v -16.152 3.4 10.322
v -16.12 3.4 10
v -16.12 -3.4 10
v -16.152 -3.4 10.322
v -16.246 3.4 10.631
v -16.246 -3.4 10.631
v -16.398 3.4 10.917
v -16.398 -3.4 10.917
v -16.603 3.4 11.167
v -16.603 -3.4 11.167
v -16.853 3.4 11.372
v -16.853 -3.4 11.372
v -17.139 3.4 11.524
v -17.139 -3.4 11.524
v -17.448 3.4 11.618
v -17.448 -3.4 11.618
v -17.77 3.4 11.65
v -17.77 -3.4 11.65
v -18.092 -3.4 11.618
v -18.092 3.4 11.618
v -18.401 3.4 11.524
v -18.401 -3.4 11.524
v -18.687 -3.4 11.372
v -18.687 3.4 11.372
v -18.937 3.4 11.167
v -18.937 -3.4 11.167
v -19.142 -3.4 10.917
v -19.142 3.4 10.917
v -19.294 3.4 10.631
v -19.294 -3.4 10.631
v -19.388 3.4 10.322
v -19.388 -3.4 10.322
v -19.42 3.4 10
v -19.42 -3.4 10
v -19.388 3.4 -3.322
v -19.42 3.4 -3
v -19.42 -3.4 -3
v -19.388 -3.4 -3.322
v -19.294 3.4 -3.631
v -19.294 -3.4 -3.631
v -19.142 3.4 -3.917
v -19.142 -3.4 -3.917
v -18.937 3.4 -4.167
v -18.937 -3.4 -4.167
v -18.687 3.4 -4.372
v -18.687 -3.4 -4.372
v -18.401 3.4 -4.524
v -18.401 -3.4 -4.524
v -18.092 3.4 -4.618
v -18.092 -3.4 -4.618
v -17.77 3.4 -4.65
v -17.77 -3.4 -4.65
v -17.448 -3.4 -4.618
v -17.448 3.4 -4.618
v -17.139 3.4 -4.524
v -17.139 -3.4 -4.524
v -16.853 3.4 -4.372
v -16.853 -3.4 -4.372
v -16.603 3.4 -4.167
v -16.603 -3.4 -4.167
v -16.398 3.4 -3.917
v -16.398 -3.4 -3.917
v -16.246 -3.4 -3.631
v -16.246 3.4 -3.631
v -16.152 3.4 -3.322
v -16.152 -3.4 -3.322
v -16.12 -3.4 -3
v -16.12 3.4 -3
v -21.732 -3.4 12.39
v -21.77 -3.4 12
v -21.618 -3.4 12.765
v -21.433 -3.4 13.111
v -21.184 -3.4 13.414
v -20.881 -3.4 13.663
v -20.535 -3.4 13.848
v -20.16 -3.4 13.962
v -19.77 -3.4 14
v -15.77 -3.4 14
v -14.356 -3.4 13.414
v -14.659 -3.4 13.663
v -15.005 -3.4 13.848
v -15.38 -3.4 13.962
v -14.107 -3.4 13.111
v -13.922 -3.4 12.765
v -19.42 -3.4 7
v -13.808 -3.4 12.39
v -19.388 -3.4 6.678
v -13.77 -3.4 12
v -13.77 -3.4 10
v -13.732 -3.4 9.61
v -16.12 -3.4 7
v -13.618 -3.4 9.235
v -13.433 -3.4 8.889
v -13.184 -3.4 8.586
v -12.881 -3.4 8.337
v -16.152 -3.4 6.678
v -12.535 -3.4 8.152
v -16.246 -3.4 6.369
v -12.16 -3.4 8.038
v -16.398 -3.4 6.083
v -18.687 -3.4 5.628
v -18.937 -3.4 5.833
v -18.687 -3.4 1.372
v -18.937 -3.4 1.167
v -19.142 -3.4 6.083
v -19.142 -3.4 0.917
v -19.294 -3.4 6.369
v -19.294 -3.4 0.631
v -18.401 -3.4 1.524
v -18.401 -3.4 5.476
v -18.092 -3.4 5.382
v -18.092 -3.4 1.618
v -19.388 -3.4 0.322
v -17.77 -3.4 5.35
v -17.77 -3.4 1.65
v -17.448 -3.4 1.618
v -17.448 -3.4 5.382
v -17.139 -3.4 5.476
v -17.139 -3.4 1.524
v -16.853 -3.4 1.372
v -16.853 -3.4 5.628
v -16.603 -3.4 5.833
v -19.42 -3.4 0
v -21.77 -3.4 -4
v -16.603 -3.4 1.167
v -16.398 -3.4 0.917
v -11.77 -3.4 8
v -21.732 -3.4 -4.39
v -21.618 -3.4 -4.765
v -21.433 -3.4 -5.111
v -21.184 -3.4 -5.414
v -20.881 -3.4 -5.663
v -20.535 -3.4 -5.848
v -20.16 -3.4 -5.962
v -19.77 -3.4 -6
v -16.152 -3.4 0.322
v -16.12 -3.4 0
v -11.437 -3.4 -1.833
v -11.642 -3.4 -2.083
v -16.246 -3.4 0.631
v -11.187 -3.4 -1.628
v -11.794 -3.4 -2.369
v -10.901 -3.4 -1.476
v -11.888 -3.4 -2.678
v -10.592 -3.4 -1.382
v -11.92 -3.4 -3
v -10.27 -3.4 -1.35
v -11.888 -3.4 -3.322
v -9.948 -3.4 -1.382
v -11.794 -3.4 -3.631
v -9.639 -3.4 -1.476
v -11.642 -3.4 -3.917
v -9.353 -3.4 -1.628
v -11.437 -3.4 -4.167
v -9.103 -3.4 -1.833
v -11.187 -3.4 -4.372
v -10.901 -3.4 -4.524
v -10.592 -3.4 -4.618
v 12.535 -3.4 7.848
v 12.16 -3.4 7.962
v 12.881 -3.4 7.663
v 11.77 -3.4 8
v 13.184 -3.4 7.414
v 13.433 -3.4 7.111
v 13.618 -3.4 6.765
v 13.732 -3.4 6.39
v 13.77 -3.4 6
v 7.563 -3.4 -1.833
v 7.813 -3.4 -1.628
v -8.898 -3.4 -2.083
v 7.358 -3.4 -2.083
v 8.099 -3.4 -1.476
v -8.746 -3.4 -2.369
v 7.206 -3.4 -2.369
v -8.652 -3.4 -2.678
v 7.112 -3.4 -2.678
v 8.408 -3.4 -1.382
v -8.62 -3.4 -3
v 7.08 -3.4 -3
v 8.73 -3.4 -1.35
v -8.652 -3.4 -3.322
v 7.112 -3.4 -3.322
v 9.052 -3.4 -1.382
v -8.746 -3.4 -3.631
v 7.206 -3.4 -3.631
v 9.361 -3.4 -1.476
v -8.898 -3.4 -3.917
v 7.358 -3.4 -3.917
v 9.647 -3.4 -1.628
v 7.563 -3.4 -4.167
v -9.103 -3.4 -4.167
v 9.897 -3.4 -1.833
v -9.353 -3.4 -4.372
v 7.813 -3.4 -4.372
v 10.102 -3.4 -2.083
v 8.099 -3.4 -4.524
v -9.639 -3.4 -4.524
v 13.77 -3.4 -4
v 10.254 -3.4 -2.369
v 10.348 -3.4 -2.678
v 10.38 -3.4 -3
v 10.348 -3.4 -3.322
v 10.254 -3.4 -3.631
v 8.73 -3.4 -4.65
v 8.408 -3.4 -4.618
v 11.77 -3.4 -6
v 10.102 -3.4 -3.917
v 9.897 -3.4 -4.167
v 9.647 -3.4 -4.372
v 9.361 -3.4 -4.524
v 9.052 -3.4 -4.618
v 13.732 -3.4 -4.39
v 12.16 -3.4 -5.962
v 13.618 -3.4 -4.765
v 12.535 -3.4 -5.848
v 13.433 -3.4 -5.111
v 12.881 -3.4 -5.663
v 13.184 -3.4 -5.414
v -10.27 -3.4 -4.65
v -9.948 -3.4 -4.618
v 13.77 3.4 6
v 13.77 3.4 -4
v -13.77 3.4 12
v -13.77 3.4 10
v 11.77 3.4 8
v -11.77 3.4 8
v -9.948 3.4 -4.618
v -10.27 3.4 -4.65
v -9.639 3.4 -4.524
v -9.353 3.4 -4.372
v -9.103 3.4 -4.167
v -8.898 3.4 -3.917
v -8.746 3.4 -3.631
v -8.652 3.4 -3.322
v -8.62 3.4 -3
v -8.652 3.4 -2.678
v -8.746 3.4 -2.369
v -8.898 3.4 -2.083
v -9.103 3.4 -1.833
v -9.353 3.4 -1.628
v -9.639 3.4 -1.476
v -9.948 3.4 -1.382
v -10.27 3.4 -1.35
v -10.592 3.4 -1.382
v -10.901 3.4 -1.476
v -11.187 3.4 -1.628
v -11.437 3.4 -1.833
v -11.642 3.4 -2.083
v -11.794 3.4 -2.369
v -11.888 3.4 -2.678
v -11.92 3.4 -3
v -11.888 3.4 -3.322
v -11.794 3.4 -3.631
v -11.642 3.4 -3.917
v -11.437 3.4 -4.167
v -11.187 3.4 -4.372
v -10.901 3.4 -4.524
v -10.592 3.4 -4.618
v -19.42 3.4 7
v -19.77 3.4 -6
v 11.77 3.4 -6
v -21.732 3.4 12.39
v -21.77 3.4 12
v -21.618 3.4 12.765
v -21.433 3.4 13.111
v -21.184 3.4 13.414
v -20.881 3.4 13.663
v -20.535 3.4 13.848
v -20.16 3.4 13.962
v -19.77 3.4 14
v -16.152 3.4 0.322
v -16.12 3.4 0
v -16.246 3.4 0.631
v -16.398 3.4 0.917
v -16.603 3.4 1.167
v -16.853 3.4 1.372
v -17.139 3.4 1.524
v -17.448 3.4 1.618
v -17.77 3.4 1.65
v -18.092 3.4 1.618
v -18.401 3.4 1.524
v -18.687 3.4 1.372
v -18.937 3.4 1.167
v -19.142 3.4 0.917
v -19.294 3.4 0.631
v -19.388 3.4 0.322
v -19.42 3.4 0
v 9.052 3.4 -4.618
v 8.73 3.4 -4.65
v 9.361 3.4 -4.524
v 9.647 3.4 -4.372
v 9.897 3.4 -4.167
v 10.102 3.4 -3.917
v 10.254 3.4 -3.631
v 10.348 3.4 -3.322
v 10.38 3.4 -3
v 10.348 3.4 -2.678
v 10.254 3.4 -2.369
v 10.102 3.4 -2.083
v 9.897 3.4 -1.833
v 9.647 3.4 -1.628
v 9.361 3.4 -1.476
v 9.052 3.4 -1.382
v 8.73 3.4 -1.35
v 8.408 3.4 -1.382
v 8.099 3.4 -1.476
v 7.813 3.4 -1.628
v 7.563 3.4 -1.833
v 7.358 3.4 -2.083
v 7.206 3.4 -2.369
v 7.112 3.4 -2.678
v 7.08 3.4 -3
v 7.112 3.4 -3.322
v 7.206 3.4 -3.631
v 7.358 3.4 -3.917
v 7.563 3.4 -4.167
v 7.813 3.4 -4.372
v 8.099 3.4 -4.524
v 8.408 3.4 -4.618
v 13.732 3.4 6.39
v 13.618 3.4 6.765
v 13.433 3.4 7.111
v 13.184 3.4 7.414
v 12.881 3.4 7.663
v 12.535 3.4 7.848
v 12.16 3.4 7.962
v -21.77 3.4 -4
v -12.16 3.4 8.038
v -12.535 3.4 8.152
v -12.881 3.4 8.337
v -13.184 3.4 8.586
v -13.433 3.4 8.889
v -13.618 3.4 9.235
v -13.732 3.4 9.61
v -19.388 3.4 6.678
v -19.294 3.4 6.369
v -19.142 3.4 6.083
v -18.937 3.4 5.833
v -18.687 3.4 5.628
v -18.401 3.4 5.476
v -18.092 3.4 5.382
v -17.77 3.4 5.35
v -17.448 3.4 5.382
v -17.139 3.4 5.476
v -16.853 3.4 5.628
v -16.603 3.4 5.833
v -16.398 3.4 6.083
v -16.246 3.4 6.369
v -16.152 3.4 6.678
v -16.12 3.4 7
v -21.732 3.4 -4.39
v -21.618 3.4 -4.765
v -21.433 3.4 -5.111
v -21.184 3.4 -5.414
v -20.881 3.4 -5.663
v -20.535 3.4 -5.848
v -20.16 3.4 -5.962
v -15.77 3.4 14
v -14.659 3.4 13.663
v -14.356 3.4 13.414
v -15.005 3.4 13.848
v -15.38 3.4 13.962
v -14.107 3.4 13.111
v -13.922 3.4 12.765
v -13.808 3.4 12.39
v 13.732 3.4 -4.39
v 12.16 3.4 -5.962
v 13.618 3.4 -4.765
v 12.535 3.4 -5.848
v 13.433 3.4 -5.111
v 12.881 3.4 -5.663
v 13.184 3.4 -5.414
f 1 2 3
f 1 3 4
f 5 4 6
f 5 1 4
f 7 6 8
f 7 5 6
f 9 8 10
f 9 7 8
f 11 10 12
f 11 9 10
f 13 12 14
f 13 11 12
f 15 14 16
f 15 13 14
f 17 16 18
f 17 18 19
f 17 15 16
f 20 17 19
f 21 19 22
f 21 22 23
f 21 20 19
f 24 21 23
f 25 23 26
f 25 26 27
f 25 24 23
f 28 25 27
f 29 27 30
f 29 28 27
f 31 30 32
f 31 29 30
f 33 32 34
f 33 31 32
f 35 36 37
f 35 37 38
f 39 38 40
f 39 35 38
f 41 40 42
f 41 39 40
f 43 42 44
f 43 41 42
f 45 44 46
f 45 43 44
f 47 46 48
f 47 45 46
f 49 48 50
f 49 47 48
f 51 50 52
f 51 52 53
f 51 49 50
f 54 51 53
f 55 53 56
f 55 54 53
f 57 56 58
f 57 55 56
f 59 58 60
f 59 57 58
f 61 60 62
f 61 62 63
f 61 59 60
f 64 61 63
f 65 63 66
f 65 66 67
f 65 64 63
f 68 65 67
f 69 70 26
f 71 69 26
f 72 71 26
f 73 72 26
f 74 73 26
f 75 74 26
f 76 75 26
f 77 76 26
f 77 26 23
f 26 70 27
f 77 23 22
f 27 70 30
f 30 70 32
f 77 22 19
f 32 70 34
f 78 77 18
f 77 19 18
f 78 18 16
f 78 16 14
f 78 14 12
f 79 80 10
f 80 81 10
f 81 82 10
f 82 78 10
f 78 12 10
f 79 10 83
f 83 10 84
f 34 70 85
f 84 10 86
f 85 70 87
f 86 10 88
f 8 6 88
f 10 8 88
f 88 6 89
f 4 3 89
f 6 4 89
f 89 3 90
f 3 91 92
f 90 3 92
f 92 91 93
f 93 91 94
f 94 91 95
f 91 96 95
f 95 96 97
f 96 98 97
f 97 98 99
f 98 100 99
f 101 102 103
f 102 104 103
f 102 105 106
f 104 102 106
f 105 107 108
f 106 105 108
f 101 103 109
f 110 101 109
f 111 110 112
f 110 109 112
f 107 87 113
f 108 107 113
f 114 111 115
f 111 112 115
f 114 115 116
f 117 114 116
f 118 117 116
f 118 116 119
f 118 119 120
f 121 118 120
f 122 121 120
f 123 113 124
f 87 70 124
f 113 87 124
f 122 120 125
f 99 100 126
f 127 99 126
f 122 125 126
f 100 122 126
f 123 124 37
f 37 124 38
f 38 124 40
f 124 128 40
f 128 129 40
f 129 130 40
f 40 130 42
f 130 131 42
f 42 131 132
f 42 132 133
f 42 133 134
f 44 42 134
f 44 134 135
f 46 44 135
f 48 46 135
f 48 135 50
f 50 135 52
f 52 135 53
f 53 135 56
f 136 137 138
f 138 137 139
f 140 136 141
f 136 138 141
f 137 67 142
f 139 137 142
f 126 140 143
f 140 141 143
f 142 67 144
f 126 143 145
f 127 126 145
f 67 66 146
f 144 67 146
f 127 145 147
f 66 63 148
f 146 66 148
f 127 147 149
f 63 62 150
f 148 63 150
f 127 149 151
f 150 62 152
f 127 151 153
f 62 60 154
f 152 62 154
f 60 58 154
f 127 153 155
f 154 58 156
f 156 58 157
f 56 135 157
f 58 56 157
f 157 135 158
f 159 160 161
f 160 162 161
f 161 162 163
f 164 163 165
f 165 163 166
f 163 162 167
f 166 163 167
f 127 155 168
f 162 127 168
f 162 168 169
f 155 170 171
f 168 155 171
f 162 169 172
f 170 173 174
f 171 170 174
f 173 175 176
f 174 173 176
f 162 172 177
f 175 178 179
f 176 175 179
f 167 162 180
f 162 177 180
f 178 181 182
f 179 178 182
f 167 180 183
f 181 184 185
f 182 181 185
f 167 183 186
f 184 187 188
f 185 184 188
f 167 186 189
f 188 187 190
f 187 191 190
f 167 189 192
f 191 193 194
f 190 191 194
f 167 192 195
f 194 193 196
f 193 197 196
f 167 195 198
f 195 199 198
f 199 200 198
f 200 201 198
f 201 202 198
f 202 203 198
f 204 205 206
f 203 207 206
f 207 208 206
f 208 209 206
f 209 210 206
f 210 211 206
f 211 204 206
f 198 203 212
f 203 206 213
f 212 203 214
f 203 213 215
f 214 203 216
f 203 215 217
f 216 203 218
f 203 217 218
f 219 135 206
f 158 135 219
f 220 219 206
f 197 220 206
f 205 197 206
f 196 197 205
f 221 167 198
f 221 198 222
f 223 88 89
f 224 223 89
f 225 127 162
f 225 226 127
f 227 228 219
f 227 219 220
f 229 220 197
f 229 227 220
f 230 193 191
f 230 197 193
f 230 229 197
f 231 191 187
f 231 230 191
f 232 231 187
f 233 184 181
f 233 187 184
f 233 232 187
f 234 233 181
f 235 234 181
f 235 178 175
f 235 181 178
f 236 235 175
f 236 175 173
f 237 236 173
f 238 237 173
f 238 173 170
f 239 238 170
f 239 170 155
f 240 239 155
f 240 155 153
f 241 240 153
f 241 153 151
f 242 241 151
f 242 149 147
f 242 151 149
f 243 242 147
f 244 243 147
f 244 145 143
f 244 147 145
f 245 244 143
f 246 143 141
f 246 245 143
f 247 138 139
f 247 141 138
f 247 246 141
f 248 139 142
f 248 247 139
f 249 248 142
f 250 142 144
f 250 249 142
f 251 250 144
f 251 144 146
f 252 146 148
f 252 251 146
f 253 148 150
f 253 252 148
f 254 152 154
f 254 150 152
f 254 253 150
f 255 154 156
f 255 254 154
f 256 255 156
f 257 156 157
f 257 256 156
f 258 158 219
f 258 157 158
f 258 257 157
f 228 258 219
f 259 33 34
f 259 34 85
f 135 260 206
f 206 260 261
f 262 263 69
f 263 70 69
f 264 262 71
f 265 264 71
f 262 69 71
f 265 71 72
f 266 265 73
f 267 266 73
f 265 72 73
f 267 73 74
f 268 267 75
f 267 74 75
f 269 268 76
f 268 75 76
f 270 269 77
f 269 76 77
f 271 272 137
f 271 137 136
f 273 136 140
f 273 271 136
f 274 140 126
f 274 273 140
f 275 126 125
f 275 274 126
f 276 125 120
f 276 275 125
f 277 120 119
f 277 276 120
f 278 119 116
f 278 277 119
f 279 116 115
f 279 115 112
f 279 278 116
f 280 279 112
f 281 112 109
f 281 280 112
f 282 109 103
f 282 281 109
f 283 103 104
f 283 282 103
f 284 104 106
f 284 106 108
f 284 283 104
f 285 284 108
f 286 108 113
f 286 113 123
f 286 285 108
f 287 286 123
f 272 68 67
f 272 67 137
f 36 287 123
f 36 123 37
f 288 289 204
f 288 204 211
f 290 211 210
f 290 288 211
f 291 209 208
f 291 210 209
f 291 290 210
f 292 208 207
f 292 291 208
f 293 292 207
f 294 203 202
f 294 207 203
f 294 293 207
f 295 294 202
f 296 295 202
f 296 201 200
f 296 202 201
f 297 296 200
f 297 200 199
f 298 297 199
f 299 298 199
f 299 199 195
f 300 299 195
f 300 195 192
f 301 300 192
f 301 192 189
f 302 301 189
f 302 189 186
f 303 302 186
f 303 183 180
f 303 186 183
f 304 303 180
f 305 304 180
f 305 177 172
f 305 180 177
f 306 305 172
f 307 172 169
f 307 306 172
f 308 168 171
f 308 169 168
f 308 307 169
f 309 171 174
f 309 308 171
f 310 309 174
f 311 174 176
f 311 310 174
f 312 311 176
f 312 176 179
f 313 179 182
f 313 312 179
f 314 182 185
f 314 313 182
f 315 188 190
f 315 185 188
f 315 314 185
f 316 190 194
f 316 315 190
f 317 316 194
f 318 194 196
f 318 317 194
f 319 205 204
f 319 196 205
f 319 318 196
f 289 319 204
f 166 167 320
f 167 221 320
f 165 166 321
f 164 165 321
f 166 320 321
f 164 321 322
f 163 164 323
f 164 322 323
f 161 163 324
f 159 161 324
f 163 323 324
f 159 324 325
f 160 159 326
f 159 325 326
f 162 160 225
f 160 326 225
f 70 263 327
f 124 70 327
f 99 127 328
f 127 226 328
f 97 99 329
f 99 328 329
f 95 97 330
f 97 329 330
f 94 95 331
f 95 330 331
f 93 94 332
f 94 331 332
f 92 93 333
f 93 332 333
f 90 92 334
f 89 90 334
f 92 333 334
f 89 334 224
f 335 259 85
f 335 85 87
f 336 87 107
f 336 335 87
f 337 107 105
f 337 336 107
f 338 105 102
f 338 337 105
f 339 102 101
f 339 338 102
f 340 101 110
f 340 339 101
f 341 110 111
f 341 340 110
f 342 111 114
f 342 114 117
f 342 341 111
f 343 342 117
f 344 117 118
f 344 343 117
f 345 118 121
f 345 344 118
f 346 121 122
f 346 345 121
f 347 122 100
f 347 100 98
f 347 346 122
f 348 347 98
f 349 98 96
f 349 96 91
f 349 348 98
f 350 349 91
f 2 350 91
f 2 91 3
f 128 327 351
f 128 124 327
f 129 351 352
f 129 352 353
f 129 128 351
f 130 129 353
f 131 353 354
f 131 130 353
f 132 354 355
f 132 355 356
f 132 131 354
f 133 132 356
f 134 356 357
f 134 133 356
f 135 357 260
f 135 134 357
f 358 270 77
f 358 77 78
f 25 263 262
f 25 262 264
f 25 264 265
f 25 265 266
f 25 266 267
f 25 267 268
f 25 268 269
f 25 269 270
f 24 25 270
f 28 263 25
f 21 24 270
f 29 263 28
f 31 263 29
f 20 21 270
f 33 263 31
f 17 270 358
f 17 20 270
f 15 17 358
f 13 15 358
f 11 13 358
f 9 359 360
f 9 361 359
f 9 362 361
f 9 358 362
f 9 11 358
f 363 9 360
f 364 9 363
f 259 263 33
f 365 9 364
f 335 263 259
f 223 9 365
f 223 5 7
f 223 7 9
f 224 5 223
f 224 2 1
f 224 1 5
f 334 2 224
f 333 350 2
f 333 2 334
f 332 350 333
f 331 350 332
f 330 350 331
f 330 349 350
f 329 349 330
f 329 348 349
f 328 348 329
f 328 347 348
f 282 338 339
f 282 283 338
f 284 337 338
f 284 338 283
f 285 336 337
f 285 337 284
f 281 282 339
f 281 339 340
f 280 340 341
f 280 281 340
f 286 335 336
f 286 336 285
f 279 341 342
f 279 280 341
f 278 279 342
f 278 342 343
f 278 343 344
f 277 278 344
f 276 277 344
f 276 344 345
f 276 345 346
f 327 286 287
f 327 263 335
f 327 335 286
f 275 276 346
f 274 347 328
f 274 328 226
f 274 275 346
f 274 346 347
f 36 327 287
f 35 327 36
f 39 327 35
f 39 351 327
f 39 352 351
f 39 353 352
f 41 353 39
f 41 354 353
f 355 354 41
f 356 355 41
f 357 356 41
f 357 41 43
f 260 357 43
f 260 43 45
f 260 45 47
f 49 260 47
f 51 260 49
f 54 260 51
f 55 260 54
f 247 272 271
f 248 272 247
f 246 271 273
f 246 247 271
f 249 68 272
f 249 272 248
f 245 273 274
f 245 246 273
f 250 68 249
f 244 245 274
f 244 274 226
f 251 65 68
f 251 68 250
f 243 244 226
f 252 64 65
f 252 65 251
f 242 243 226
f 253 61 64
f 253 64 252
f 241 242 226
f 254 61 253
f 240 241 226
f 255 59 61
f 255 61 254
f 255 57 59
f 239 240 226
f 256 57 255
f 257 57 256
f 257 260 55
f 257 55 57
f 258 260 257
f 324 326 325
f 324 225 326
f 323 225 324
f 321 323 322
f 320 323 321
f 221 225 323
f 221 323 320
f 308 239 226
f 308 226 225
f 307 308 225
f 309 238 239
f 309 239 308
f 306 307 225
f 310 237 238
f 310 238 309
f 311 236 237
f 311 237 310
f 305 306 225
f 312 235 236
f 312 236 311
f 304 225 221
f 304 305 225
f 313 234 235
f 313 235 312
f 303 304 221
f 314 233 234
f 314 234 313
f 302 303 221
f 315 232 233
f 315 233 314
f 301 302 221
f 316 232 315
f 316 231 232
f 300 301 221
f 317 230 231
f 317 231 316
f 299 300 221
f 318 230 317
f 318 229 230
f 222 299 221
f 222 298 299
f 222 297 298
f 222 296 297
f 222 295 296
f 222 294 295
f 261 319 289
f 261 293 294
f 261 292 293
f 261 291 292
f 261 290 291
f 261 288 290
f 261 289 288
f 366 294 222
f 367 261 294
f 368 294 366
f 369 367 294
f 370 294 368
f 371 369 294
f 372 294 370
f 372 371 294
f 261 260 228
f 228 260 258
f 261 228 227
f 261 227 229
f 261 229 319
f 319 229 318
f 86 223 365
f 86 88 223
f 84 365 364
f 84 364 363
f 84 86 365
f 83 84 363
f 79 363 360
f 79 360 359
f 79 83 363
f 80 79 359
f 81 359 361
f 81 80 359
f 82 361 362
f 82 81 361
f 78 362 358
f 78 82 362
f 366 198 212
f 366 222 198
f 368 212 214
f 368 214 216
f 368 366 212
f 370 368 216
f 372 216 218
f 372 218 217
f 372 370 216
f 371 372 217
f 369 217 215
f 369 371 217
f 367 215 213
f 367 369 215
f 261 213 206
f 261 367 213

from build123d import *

# Parameters (mm, degrees)
SKETCH1_W               = 27.54
SKETCH1_H               = 6.8
BOSS_EXTRUDE1_DEPTH     = 8
SKETCH4_W               = 27.54
SKETCH4_H               = 6.8
BOSS_EXTRUDE2_DEPTH     = 6
CUT_EXTRUDE2_DEPTH      = 18.316261144
CUT_EXTRUDE2_DEPTH_BACK = 18.316261144
SKETCH3_R               = 1.65
SKETCH7_W               = 8
SKETCH7_H               = 20
BOSS_EXTRUDE3_DEPTH     = 6.8
FILLET1_R               = 2


with BuildPart() as part:
    # Sketch1 → Boss-Extrude1 (new body)
    with BuildSketch(Plane.XY):
        Rectangle(SKETCH1_W, SKETCH1_H)
    extrude(amount=BOSS_EXTRUDE1_DEPTH)

    # Sketch4 → Boss-Extrude2 (add)
    with BuildSketch(Plane(origin=(0, 0, 0), x_dir=(-1, 0, 0), z_dir=(0, 0, -1))):
        Rectangle(SKETCH4_W, SKETCH4_H)
    extrude(amount=BOSS_EXTRUDE2_DEPTH)

    # Sketch3 → Cut-Extrude2 (cut, two sides: drawn at the far end of the back side and taken through both)
    with BuildSketch(Plane.XZ.offset(3.4).offset(-CUT_EXTRUDE2_DEPTH_BACK)):
        with Locations(Location((8.73, -3, 0), (0, 0, 270))):
            Circle(SKETCH3_R)
        with Locations(Location((-10.27, -3, 0), (0, 0, 270))):
            Circle(SKETCH3_R)
    extrude(amount=CUT_EXTRUDE2_DEPTH + CUT_EXTRUDE2_DEPTH_BACK, mode=Mode.SUBTRACT)

    # Sketch7 → Boss-Extrude3 (add)
    with BuildSketch(Plane(origin=(0, 3.4, 0), x_dir=(1, 0, 0), z_dir=(0, 1, 0))):
        with Locations((-17.77, -4)):
            Rectangle(SKETCH7_W, SKETCH7_H)
        with BuildLine():
            Line((-16.12, 3), (-16.12, 0))
            ThreePointArc((-16.12, 0), (-17.77, -1.65), (-19.42, 0))
            Line((-19.42, 0), (-19.42, 3))
            ThreePointArc((-19.42, 3), (-17.77, 4.65), (-16.12, 3))
        make_face(mode=Mode.SUBTRACT)
        with BuildLine():
            Line((-16.12, -7), (-16.12, -10))
            ThreePointArc((-16.12, -10), (-17.77, -11.65), (-19.42, -10))
            Line((-19.42, -10), (-19.42, -7))
            ThreePointArc((-19.42, -7), (-17.77, -5.35), (-16.12, -7))
        make_face(mode=Mode.SUBTRACT)
    extrude(amount=-BOSS_EXTRUDE3_DEPTH)

    # Fillet1
    fillet1_edges = [part.edges().sort_by_distance(p)[0] for p in [
        (13.77, 0, -6),
        (-13.77, 0, 8),
        (-21.77, 0, -6),
        (-21.77, 0, 14),
        (-13.77, 0, 14),
        (13.77, 0, 8),
    ]]
    fillet(fillet1_edges, radius=FILLET1_R)


solid = part.part
